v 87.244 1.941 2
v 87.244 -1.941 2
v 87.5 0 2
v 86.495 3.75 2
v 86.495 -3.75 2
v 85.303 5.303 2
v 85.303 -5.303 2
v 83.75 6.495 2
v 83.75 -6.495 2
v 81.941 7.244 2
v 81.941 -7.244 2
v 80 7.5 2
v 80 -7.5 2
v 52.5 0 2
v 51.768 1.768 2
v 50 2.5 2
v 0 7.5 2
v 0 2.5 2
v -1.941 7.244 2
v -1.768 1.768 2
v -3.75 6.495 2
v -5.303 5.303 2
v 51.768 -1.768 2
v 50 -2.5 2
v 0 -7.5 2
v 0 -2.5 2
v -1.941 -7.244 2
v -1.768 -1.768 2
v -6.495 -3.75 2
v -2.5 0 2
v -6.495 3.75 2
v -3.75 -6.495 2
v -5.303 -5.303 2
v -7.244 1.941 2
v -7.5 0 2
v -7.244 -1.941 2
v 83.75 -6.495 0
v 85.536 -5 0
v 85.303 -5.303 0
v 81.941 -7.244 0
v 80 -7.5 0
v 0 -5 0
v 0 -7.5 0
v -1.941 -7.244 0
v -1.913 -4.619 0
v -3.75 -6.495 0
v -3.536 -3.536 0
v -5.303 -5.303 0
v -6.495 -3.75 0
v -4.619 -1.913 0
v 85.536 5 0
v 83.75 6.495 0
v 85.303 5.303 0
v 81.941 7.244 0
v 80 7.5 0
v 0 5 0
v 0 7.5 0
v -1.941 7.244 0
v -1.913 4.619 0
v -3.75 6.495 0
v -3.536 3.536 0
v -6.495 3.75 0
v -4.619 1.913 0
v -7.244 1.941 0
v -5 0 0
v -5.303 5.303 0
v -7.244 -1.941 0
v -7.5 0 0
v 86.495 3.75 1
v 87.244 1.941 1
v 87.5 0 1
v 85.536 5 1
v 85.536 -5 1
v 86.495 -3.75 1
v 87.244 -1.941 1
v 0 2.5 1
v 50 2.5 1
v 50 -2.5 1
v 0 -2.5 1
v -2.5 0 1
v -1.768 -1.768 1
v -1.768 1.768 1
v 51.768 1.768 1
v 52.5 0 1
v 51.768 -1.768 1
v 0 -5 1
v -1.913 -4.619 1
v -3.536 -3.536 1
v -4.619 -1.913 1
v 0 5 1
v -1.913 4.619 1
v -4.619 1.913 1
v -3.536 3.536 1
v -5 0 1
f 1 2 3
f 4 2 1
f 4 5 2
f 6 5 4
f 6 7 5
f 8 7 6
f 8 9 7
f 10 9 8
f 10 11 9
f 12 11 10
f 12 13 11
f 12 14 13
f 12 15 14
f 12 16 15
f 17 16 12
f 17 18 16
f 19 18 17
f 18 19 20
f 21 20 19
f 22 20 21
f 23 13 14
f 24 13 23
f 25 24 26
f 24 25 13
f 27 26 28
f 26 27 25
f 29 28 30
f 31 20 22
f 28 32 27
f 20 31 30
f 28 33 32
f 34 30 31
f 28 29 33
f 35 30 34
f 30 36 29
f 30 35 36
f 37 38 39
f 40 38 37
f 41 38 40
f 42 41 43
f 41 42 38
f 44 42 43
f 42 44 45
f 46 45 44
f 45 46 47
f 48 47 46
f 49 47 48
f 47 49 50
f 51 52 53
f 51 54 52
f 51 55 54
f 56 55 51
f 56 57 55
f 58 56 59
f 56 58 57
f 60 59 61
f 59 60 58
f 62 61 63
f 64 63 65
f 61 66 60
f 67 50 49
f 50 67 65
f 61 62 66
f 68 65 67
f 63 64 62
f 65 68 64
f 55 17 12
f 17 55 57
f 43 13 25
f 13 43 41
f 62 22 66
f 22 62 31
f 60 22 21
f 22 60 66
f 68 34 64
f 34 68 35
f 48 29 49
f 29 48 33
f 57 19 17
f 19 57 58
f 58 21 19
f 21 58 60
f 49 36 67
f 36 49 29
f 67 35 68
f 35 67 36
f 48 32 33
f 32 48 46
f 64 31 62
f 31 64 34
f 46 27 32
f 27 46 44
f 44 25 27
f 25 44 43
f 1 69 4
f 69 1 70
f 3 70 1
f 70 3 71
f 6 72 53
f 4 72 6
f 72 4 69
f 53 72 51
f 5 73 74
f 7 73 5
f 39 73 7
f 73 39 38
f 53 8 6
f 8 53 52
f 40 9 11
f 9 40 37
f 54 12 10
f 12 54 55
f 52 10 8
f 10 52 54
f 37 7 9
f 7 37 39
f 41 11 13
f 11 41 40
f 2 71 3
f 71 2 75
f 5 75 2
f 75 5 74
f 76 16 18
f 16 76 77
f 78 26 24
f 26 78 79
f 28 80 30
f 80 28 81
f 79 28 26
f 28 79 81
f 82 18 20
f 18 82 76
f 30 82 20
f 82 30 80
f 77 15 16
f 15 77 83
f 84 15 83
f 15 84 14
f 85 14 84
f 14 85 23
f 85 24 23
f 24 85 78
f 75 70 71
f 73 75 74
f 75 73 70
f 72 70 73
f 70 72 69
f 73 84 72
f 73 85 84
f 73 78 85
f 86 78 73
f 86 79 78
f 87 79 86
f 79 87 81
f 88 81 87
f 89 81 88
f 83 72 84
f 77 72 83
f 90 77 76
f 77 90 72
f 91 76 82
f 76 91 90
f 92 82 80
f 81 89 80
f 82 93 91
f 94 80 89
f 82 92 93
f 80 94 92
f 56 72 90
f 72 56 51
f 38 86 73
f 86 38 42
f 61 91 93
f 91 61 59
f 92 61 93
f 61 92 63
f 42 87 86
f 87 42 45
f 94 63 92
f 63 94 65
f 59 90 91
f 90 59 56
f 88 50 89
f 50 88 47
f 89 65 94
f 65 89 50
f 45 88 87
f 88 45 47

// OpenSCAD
Longueur=80;
largeur = 15;
H = 2;


difference()
{
union()
{
    translate([0,-largeur/2,0])cube([Longueur,largeur,H]);
    cylinder(h=H, d=largeur);
    translate([Longueur,0,0])cylinder(h=H, d=largeur);
}

Longueur2=50;
largeur2 = 5;
H2 = 10;

translate([0,0,-1])union()
{
    translate([0,-largeur2/2,0])cube([Longueur2,largeur2,H2]);
    cylinder(h=H2, d=largeur2);
    translate([Longueur2,0,0])cylinder(h=H2, d=largeur2);
}

Longueur3=100;
largeur3 = 10;
H3 = 1;
#translate([0,0,0])union()
{
    translate([0,-largeur3/2,0])cube([Longueur3,largeur3,H3]);
    cylinder(h=H3, d=largeur3);
    translate([Longueur3,0,0])cylinder(h=H3, d=largeur3);
}


}
